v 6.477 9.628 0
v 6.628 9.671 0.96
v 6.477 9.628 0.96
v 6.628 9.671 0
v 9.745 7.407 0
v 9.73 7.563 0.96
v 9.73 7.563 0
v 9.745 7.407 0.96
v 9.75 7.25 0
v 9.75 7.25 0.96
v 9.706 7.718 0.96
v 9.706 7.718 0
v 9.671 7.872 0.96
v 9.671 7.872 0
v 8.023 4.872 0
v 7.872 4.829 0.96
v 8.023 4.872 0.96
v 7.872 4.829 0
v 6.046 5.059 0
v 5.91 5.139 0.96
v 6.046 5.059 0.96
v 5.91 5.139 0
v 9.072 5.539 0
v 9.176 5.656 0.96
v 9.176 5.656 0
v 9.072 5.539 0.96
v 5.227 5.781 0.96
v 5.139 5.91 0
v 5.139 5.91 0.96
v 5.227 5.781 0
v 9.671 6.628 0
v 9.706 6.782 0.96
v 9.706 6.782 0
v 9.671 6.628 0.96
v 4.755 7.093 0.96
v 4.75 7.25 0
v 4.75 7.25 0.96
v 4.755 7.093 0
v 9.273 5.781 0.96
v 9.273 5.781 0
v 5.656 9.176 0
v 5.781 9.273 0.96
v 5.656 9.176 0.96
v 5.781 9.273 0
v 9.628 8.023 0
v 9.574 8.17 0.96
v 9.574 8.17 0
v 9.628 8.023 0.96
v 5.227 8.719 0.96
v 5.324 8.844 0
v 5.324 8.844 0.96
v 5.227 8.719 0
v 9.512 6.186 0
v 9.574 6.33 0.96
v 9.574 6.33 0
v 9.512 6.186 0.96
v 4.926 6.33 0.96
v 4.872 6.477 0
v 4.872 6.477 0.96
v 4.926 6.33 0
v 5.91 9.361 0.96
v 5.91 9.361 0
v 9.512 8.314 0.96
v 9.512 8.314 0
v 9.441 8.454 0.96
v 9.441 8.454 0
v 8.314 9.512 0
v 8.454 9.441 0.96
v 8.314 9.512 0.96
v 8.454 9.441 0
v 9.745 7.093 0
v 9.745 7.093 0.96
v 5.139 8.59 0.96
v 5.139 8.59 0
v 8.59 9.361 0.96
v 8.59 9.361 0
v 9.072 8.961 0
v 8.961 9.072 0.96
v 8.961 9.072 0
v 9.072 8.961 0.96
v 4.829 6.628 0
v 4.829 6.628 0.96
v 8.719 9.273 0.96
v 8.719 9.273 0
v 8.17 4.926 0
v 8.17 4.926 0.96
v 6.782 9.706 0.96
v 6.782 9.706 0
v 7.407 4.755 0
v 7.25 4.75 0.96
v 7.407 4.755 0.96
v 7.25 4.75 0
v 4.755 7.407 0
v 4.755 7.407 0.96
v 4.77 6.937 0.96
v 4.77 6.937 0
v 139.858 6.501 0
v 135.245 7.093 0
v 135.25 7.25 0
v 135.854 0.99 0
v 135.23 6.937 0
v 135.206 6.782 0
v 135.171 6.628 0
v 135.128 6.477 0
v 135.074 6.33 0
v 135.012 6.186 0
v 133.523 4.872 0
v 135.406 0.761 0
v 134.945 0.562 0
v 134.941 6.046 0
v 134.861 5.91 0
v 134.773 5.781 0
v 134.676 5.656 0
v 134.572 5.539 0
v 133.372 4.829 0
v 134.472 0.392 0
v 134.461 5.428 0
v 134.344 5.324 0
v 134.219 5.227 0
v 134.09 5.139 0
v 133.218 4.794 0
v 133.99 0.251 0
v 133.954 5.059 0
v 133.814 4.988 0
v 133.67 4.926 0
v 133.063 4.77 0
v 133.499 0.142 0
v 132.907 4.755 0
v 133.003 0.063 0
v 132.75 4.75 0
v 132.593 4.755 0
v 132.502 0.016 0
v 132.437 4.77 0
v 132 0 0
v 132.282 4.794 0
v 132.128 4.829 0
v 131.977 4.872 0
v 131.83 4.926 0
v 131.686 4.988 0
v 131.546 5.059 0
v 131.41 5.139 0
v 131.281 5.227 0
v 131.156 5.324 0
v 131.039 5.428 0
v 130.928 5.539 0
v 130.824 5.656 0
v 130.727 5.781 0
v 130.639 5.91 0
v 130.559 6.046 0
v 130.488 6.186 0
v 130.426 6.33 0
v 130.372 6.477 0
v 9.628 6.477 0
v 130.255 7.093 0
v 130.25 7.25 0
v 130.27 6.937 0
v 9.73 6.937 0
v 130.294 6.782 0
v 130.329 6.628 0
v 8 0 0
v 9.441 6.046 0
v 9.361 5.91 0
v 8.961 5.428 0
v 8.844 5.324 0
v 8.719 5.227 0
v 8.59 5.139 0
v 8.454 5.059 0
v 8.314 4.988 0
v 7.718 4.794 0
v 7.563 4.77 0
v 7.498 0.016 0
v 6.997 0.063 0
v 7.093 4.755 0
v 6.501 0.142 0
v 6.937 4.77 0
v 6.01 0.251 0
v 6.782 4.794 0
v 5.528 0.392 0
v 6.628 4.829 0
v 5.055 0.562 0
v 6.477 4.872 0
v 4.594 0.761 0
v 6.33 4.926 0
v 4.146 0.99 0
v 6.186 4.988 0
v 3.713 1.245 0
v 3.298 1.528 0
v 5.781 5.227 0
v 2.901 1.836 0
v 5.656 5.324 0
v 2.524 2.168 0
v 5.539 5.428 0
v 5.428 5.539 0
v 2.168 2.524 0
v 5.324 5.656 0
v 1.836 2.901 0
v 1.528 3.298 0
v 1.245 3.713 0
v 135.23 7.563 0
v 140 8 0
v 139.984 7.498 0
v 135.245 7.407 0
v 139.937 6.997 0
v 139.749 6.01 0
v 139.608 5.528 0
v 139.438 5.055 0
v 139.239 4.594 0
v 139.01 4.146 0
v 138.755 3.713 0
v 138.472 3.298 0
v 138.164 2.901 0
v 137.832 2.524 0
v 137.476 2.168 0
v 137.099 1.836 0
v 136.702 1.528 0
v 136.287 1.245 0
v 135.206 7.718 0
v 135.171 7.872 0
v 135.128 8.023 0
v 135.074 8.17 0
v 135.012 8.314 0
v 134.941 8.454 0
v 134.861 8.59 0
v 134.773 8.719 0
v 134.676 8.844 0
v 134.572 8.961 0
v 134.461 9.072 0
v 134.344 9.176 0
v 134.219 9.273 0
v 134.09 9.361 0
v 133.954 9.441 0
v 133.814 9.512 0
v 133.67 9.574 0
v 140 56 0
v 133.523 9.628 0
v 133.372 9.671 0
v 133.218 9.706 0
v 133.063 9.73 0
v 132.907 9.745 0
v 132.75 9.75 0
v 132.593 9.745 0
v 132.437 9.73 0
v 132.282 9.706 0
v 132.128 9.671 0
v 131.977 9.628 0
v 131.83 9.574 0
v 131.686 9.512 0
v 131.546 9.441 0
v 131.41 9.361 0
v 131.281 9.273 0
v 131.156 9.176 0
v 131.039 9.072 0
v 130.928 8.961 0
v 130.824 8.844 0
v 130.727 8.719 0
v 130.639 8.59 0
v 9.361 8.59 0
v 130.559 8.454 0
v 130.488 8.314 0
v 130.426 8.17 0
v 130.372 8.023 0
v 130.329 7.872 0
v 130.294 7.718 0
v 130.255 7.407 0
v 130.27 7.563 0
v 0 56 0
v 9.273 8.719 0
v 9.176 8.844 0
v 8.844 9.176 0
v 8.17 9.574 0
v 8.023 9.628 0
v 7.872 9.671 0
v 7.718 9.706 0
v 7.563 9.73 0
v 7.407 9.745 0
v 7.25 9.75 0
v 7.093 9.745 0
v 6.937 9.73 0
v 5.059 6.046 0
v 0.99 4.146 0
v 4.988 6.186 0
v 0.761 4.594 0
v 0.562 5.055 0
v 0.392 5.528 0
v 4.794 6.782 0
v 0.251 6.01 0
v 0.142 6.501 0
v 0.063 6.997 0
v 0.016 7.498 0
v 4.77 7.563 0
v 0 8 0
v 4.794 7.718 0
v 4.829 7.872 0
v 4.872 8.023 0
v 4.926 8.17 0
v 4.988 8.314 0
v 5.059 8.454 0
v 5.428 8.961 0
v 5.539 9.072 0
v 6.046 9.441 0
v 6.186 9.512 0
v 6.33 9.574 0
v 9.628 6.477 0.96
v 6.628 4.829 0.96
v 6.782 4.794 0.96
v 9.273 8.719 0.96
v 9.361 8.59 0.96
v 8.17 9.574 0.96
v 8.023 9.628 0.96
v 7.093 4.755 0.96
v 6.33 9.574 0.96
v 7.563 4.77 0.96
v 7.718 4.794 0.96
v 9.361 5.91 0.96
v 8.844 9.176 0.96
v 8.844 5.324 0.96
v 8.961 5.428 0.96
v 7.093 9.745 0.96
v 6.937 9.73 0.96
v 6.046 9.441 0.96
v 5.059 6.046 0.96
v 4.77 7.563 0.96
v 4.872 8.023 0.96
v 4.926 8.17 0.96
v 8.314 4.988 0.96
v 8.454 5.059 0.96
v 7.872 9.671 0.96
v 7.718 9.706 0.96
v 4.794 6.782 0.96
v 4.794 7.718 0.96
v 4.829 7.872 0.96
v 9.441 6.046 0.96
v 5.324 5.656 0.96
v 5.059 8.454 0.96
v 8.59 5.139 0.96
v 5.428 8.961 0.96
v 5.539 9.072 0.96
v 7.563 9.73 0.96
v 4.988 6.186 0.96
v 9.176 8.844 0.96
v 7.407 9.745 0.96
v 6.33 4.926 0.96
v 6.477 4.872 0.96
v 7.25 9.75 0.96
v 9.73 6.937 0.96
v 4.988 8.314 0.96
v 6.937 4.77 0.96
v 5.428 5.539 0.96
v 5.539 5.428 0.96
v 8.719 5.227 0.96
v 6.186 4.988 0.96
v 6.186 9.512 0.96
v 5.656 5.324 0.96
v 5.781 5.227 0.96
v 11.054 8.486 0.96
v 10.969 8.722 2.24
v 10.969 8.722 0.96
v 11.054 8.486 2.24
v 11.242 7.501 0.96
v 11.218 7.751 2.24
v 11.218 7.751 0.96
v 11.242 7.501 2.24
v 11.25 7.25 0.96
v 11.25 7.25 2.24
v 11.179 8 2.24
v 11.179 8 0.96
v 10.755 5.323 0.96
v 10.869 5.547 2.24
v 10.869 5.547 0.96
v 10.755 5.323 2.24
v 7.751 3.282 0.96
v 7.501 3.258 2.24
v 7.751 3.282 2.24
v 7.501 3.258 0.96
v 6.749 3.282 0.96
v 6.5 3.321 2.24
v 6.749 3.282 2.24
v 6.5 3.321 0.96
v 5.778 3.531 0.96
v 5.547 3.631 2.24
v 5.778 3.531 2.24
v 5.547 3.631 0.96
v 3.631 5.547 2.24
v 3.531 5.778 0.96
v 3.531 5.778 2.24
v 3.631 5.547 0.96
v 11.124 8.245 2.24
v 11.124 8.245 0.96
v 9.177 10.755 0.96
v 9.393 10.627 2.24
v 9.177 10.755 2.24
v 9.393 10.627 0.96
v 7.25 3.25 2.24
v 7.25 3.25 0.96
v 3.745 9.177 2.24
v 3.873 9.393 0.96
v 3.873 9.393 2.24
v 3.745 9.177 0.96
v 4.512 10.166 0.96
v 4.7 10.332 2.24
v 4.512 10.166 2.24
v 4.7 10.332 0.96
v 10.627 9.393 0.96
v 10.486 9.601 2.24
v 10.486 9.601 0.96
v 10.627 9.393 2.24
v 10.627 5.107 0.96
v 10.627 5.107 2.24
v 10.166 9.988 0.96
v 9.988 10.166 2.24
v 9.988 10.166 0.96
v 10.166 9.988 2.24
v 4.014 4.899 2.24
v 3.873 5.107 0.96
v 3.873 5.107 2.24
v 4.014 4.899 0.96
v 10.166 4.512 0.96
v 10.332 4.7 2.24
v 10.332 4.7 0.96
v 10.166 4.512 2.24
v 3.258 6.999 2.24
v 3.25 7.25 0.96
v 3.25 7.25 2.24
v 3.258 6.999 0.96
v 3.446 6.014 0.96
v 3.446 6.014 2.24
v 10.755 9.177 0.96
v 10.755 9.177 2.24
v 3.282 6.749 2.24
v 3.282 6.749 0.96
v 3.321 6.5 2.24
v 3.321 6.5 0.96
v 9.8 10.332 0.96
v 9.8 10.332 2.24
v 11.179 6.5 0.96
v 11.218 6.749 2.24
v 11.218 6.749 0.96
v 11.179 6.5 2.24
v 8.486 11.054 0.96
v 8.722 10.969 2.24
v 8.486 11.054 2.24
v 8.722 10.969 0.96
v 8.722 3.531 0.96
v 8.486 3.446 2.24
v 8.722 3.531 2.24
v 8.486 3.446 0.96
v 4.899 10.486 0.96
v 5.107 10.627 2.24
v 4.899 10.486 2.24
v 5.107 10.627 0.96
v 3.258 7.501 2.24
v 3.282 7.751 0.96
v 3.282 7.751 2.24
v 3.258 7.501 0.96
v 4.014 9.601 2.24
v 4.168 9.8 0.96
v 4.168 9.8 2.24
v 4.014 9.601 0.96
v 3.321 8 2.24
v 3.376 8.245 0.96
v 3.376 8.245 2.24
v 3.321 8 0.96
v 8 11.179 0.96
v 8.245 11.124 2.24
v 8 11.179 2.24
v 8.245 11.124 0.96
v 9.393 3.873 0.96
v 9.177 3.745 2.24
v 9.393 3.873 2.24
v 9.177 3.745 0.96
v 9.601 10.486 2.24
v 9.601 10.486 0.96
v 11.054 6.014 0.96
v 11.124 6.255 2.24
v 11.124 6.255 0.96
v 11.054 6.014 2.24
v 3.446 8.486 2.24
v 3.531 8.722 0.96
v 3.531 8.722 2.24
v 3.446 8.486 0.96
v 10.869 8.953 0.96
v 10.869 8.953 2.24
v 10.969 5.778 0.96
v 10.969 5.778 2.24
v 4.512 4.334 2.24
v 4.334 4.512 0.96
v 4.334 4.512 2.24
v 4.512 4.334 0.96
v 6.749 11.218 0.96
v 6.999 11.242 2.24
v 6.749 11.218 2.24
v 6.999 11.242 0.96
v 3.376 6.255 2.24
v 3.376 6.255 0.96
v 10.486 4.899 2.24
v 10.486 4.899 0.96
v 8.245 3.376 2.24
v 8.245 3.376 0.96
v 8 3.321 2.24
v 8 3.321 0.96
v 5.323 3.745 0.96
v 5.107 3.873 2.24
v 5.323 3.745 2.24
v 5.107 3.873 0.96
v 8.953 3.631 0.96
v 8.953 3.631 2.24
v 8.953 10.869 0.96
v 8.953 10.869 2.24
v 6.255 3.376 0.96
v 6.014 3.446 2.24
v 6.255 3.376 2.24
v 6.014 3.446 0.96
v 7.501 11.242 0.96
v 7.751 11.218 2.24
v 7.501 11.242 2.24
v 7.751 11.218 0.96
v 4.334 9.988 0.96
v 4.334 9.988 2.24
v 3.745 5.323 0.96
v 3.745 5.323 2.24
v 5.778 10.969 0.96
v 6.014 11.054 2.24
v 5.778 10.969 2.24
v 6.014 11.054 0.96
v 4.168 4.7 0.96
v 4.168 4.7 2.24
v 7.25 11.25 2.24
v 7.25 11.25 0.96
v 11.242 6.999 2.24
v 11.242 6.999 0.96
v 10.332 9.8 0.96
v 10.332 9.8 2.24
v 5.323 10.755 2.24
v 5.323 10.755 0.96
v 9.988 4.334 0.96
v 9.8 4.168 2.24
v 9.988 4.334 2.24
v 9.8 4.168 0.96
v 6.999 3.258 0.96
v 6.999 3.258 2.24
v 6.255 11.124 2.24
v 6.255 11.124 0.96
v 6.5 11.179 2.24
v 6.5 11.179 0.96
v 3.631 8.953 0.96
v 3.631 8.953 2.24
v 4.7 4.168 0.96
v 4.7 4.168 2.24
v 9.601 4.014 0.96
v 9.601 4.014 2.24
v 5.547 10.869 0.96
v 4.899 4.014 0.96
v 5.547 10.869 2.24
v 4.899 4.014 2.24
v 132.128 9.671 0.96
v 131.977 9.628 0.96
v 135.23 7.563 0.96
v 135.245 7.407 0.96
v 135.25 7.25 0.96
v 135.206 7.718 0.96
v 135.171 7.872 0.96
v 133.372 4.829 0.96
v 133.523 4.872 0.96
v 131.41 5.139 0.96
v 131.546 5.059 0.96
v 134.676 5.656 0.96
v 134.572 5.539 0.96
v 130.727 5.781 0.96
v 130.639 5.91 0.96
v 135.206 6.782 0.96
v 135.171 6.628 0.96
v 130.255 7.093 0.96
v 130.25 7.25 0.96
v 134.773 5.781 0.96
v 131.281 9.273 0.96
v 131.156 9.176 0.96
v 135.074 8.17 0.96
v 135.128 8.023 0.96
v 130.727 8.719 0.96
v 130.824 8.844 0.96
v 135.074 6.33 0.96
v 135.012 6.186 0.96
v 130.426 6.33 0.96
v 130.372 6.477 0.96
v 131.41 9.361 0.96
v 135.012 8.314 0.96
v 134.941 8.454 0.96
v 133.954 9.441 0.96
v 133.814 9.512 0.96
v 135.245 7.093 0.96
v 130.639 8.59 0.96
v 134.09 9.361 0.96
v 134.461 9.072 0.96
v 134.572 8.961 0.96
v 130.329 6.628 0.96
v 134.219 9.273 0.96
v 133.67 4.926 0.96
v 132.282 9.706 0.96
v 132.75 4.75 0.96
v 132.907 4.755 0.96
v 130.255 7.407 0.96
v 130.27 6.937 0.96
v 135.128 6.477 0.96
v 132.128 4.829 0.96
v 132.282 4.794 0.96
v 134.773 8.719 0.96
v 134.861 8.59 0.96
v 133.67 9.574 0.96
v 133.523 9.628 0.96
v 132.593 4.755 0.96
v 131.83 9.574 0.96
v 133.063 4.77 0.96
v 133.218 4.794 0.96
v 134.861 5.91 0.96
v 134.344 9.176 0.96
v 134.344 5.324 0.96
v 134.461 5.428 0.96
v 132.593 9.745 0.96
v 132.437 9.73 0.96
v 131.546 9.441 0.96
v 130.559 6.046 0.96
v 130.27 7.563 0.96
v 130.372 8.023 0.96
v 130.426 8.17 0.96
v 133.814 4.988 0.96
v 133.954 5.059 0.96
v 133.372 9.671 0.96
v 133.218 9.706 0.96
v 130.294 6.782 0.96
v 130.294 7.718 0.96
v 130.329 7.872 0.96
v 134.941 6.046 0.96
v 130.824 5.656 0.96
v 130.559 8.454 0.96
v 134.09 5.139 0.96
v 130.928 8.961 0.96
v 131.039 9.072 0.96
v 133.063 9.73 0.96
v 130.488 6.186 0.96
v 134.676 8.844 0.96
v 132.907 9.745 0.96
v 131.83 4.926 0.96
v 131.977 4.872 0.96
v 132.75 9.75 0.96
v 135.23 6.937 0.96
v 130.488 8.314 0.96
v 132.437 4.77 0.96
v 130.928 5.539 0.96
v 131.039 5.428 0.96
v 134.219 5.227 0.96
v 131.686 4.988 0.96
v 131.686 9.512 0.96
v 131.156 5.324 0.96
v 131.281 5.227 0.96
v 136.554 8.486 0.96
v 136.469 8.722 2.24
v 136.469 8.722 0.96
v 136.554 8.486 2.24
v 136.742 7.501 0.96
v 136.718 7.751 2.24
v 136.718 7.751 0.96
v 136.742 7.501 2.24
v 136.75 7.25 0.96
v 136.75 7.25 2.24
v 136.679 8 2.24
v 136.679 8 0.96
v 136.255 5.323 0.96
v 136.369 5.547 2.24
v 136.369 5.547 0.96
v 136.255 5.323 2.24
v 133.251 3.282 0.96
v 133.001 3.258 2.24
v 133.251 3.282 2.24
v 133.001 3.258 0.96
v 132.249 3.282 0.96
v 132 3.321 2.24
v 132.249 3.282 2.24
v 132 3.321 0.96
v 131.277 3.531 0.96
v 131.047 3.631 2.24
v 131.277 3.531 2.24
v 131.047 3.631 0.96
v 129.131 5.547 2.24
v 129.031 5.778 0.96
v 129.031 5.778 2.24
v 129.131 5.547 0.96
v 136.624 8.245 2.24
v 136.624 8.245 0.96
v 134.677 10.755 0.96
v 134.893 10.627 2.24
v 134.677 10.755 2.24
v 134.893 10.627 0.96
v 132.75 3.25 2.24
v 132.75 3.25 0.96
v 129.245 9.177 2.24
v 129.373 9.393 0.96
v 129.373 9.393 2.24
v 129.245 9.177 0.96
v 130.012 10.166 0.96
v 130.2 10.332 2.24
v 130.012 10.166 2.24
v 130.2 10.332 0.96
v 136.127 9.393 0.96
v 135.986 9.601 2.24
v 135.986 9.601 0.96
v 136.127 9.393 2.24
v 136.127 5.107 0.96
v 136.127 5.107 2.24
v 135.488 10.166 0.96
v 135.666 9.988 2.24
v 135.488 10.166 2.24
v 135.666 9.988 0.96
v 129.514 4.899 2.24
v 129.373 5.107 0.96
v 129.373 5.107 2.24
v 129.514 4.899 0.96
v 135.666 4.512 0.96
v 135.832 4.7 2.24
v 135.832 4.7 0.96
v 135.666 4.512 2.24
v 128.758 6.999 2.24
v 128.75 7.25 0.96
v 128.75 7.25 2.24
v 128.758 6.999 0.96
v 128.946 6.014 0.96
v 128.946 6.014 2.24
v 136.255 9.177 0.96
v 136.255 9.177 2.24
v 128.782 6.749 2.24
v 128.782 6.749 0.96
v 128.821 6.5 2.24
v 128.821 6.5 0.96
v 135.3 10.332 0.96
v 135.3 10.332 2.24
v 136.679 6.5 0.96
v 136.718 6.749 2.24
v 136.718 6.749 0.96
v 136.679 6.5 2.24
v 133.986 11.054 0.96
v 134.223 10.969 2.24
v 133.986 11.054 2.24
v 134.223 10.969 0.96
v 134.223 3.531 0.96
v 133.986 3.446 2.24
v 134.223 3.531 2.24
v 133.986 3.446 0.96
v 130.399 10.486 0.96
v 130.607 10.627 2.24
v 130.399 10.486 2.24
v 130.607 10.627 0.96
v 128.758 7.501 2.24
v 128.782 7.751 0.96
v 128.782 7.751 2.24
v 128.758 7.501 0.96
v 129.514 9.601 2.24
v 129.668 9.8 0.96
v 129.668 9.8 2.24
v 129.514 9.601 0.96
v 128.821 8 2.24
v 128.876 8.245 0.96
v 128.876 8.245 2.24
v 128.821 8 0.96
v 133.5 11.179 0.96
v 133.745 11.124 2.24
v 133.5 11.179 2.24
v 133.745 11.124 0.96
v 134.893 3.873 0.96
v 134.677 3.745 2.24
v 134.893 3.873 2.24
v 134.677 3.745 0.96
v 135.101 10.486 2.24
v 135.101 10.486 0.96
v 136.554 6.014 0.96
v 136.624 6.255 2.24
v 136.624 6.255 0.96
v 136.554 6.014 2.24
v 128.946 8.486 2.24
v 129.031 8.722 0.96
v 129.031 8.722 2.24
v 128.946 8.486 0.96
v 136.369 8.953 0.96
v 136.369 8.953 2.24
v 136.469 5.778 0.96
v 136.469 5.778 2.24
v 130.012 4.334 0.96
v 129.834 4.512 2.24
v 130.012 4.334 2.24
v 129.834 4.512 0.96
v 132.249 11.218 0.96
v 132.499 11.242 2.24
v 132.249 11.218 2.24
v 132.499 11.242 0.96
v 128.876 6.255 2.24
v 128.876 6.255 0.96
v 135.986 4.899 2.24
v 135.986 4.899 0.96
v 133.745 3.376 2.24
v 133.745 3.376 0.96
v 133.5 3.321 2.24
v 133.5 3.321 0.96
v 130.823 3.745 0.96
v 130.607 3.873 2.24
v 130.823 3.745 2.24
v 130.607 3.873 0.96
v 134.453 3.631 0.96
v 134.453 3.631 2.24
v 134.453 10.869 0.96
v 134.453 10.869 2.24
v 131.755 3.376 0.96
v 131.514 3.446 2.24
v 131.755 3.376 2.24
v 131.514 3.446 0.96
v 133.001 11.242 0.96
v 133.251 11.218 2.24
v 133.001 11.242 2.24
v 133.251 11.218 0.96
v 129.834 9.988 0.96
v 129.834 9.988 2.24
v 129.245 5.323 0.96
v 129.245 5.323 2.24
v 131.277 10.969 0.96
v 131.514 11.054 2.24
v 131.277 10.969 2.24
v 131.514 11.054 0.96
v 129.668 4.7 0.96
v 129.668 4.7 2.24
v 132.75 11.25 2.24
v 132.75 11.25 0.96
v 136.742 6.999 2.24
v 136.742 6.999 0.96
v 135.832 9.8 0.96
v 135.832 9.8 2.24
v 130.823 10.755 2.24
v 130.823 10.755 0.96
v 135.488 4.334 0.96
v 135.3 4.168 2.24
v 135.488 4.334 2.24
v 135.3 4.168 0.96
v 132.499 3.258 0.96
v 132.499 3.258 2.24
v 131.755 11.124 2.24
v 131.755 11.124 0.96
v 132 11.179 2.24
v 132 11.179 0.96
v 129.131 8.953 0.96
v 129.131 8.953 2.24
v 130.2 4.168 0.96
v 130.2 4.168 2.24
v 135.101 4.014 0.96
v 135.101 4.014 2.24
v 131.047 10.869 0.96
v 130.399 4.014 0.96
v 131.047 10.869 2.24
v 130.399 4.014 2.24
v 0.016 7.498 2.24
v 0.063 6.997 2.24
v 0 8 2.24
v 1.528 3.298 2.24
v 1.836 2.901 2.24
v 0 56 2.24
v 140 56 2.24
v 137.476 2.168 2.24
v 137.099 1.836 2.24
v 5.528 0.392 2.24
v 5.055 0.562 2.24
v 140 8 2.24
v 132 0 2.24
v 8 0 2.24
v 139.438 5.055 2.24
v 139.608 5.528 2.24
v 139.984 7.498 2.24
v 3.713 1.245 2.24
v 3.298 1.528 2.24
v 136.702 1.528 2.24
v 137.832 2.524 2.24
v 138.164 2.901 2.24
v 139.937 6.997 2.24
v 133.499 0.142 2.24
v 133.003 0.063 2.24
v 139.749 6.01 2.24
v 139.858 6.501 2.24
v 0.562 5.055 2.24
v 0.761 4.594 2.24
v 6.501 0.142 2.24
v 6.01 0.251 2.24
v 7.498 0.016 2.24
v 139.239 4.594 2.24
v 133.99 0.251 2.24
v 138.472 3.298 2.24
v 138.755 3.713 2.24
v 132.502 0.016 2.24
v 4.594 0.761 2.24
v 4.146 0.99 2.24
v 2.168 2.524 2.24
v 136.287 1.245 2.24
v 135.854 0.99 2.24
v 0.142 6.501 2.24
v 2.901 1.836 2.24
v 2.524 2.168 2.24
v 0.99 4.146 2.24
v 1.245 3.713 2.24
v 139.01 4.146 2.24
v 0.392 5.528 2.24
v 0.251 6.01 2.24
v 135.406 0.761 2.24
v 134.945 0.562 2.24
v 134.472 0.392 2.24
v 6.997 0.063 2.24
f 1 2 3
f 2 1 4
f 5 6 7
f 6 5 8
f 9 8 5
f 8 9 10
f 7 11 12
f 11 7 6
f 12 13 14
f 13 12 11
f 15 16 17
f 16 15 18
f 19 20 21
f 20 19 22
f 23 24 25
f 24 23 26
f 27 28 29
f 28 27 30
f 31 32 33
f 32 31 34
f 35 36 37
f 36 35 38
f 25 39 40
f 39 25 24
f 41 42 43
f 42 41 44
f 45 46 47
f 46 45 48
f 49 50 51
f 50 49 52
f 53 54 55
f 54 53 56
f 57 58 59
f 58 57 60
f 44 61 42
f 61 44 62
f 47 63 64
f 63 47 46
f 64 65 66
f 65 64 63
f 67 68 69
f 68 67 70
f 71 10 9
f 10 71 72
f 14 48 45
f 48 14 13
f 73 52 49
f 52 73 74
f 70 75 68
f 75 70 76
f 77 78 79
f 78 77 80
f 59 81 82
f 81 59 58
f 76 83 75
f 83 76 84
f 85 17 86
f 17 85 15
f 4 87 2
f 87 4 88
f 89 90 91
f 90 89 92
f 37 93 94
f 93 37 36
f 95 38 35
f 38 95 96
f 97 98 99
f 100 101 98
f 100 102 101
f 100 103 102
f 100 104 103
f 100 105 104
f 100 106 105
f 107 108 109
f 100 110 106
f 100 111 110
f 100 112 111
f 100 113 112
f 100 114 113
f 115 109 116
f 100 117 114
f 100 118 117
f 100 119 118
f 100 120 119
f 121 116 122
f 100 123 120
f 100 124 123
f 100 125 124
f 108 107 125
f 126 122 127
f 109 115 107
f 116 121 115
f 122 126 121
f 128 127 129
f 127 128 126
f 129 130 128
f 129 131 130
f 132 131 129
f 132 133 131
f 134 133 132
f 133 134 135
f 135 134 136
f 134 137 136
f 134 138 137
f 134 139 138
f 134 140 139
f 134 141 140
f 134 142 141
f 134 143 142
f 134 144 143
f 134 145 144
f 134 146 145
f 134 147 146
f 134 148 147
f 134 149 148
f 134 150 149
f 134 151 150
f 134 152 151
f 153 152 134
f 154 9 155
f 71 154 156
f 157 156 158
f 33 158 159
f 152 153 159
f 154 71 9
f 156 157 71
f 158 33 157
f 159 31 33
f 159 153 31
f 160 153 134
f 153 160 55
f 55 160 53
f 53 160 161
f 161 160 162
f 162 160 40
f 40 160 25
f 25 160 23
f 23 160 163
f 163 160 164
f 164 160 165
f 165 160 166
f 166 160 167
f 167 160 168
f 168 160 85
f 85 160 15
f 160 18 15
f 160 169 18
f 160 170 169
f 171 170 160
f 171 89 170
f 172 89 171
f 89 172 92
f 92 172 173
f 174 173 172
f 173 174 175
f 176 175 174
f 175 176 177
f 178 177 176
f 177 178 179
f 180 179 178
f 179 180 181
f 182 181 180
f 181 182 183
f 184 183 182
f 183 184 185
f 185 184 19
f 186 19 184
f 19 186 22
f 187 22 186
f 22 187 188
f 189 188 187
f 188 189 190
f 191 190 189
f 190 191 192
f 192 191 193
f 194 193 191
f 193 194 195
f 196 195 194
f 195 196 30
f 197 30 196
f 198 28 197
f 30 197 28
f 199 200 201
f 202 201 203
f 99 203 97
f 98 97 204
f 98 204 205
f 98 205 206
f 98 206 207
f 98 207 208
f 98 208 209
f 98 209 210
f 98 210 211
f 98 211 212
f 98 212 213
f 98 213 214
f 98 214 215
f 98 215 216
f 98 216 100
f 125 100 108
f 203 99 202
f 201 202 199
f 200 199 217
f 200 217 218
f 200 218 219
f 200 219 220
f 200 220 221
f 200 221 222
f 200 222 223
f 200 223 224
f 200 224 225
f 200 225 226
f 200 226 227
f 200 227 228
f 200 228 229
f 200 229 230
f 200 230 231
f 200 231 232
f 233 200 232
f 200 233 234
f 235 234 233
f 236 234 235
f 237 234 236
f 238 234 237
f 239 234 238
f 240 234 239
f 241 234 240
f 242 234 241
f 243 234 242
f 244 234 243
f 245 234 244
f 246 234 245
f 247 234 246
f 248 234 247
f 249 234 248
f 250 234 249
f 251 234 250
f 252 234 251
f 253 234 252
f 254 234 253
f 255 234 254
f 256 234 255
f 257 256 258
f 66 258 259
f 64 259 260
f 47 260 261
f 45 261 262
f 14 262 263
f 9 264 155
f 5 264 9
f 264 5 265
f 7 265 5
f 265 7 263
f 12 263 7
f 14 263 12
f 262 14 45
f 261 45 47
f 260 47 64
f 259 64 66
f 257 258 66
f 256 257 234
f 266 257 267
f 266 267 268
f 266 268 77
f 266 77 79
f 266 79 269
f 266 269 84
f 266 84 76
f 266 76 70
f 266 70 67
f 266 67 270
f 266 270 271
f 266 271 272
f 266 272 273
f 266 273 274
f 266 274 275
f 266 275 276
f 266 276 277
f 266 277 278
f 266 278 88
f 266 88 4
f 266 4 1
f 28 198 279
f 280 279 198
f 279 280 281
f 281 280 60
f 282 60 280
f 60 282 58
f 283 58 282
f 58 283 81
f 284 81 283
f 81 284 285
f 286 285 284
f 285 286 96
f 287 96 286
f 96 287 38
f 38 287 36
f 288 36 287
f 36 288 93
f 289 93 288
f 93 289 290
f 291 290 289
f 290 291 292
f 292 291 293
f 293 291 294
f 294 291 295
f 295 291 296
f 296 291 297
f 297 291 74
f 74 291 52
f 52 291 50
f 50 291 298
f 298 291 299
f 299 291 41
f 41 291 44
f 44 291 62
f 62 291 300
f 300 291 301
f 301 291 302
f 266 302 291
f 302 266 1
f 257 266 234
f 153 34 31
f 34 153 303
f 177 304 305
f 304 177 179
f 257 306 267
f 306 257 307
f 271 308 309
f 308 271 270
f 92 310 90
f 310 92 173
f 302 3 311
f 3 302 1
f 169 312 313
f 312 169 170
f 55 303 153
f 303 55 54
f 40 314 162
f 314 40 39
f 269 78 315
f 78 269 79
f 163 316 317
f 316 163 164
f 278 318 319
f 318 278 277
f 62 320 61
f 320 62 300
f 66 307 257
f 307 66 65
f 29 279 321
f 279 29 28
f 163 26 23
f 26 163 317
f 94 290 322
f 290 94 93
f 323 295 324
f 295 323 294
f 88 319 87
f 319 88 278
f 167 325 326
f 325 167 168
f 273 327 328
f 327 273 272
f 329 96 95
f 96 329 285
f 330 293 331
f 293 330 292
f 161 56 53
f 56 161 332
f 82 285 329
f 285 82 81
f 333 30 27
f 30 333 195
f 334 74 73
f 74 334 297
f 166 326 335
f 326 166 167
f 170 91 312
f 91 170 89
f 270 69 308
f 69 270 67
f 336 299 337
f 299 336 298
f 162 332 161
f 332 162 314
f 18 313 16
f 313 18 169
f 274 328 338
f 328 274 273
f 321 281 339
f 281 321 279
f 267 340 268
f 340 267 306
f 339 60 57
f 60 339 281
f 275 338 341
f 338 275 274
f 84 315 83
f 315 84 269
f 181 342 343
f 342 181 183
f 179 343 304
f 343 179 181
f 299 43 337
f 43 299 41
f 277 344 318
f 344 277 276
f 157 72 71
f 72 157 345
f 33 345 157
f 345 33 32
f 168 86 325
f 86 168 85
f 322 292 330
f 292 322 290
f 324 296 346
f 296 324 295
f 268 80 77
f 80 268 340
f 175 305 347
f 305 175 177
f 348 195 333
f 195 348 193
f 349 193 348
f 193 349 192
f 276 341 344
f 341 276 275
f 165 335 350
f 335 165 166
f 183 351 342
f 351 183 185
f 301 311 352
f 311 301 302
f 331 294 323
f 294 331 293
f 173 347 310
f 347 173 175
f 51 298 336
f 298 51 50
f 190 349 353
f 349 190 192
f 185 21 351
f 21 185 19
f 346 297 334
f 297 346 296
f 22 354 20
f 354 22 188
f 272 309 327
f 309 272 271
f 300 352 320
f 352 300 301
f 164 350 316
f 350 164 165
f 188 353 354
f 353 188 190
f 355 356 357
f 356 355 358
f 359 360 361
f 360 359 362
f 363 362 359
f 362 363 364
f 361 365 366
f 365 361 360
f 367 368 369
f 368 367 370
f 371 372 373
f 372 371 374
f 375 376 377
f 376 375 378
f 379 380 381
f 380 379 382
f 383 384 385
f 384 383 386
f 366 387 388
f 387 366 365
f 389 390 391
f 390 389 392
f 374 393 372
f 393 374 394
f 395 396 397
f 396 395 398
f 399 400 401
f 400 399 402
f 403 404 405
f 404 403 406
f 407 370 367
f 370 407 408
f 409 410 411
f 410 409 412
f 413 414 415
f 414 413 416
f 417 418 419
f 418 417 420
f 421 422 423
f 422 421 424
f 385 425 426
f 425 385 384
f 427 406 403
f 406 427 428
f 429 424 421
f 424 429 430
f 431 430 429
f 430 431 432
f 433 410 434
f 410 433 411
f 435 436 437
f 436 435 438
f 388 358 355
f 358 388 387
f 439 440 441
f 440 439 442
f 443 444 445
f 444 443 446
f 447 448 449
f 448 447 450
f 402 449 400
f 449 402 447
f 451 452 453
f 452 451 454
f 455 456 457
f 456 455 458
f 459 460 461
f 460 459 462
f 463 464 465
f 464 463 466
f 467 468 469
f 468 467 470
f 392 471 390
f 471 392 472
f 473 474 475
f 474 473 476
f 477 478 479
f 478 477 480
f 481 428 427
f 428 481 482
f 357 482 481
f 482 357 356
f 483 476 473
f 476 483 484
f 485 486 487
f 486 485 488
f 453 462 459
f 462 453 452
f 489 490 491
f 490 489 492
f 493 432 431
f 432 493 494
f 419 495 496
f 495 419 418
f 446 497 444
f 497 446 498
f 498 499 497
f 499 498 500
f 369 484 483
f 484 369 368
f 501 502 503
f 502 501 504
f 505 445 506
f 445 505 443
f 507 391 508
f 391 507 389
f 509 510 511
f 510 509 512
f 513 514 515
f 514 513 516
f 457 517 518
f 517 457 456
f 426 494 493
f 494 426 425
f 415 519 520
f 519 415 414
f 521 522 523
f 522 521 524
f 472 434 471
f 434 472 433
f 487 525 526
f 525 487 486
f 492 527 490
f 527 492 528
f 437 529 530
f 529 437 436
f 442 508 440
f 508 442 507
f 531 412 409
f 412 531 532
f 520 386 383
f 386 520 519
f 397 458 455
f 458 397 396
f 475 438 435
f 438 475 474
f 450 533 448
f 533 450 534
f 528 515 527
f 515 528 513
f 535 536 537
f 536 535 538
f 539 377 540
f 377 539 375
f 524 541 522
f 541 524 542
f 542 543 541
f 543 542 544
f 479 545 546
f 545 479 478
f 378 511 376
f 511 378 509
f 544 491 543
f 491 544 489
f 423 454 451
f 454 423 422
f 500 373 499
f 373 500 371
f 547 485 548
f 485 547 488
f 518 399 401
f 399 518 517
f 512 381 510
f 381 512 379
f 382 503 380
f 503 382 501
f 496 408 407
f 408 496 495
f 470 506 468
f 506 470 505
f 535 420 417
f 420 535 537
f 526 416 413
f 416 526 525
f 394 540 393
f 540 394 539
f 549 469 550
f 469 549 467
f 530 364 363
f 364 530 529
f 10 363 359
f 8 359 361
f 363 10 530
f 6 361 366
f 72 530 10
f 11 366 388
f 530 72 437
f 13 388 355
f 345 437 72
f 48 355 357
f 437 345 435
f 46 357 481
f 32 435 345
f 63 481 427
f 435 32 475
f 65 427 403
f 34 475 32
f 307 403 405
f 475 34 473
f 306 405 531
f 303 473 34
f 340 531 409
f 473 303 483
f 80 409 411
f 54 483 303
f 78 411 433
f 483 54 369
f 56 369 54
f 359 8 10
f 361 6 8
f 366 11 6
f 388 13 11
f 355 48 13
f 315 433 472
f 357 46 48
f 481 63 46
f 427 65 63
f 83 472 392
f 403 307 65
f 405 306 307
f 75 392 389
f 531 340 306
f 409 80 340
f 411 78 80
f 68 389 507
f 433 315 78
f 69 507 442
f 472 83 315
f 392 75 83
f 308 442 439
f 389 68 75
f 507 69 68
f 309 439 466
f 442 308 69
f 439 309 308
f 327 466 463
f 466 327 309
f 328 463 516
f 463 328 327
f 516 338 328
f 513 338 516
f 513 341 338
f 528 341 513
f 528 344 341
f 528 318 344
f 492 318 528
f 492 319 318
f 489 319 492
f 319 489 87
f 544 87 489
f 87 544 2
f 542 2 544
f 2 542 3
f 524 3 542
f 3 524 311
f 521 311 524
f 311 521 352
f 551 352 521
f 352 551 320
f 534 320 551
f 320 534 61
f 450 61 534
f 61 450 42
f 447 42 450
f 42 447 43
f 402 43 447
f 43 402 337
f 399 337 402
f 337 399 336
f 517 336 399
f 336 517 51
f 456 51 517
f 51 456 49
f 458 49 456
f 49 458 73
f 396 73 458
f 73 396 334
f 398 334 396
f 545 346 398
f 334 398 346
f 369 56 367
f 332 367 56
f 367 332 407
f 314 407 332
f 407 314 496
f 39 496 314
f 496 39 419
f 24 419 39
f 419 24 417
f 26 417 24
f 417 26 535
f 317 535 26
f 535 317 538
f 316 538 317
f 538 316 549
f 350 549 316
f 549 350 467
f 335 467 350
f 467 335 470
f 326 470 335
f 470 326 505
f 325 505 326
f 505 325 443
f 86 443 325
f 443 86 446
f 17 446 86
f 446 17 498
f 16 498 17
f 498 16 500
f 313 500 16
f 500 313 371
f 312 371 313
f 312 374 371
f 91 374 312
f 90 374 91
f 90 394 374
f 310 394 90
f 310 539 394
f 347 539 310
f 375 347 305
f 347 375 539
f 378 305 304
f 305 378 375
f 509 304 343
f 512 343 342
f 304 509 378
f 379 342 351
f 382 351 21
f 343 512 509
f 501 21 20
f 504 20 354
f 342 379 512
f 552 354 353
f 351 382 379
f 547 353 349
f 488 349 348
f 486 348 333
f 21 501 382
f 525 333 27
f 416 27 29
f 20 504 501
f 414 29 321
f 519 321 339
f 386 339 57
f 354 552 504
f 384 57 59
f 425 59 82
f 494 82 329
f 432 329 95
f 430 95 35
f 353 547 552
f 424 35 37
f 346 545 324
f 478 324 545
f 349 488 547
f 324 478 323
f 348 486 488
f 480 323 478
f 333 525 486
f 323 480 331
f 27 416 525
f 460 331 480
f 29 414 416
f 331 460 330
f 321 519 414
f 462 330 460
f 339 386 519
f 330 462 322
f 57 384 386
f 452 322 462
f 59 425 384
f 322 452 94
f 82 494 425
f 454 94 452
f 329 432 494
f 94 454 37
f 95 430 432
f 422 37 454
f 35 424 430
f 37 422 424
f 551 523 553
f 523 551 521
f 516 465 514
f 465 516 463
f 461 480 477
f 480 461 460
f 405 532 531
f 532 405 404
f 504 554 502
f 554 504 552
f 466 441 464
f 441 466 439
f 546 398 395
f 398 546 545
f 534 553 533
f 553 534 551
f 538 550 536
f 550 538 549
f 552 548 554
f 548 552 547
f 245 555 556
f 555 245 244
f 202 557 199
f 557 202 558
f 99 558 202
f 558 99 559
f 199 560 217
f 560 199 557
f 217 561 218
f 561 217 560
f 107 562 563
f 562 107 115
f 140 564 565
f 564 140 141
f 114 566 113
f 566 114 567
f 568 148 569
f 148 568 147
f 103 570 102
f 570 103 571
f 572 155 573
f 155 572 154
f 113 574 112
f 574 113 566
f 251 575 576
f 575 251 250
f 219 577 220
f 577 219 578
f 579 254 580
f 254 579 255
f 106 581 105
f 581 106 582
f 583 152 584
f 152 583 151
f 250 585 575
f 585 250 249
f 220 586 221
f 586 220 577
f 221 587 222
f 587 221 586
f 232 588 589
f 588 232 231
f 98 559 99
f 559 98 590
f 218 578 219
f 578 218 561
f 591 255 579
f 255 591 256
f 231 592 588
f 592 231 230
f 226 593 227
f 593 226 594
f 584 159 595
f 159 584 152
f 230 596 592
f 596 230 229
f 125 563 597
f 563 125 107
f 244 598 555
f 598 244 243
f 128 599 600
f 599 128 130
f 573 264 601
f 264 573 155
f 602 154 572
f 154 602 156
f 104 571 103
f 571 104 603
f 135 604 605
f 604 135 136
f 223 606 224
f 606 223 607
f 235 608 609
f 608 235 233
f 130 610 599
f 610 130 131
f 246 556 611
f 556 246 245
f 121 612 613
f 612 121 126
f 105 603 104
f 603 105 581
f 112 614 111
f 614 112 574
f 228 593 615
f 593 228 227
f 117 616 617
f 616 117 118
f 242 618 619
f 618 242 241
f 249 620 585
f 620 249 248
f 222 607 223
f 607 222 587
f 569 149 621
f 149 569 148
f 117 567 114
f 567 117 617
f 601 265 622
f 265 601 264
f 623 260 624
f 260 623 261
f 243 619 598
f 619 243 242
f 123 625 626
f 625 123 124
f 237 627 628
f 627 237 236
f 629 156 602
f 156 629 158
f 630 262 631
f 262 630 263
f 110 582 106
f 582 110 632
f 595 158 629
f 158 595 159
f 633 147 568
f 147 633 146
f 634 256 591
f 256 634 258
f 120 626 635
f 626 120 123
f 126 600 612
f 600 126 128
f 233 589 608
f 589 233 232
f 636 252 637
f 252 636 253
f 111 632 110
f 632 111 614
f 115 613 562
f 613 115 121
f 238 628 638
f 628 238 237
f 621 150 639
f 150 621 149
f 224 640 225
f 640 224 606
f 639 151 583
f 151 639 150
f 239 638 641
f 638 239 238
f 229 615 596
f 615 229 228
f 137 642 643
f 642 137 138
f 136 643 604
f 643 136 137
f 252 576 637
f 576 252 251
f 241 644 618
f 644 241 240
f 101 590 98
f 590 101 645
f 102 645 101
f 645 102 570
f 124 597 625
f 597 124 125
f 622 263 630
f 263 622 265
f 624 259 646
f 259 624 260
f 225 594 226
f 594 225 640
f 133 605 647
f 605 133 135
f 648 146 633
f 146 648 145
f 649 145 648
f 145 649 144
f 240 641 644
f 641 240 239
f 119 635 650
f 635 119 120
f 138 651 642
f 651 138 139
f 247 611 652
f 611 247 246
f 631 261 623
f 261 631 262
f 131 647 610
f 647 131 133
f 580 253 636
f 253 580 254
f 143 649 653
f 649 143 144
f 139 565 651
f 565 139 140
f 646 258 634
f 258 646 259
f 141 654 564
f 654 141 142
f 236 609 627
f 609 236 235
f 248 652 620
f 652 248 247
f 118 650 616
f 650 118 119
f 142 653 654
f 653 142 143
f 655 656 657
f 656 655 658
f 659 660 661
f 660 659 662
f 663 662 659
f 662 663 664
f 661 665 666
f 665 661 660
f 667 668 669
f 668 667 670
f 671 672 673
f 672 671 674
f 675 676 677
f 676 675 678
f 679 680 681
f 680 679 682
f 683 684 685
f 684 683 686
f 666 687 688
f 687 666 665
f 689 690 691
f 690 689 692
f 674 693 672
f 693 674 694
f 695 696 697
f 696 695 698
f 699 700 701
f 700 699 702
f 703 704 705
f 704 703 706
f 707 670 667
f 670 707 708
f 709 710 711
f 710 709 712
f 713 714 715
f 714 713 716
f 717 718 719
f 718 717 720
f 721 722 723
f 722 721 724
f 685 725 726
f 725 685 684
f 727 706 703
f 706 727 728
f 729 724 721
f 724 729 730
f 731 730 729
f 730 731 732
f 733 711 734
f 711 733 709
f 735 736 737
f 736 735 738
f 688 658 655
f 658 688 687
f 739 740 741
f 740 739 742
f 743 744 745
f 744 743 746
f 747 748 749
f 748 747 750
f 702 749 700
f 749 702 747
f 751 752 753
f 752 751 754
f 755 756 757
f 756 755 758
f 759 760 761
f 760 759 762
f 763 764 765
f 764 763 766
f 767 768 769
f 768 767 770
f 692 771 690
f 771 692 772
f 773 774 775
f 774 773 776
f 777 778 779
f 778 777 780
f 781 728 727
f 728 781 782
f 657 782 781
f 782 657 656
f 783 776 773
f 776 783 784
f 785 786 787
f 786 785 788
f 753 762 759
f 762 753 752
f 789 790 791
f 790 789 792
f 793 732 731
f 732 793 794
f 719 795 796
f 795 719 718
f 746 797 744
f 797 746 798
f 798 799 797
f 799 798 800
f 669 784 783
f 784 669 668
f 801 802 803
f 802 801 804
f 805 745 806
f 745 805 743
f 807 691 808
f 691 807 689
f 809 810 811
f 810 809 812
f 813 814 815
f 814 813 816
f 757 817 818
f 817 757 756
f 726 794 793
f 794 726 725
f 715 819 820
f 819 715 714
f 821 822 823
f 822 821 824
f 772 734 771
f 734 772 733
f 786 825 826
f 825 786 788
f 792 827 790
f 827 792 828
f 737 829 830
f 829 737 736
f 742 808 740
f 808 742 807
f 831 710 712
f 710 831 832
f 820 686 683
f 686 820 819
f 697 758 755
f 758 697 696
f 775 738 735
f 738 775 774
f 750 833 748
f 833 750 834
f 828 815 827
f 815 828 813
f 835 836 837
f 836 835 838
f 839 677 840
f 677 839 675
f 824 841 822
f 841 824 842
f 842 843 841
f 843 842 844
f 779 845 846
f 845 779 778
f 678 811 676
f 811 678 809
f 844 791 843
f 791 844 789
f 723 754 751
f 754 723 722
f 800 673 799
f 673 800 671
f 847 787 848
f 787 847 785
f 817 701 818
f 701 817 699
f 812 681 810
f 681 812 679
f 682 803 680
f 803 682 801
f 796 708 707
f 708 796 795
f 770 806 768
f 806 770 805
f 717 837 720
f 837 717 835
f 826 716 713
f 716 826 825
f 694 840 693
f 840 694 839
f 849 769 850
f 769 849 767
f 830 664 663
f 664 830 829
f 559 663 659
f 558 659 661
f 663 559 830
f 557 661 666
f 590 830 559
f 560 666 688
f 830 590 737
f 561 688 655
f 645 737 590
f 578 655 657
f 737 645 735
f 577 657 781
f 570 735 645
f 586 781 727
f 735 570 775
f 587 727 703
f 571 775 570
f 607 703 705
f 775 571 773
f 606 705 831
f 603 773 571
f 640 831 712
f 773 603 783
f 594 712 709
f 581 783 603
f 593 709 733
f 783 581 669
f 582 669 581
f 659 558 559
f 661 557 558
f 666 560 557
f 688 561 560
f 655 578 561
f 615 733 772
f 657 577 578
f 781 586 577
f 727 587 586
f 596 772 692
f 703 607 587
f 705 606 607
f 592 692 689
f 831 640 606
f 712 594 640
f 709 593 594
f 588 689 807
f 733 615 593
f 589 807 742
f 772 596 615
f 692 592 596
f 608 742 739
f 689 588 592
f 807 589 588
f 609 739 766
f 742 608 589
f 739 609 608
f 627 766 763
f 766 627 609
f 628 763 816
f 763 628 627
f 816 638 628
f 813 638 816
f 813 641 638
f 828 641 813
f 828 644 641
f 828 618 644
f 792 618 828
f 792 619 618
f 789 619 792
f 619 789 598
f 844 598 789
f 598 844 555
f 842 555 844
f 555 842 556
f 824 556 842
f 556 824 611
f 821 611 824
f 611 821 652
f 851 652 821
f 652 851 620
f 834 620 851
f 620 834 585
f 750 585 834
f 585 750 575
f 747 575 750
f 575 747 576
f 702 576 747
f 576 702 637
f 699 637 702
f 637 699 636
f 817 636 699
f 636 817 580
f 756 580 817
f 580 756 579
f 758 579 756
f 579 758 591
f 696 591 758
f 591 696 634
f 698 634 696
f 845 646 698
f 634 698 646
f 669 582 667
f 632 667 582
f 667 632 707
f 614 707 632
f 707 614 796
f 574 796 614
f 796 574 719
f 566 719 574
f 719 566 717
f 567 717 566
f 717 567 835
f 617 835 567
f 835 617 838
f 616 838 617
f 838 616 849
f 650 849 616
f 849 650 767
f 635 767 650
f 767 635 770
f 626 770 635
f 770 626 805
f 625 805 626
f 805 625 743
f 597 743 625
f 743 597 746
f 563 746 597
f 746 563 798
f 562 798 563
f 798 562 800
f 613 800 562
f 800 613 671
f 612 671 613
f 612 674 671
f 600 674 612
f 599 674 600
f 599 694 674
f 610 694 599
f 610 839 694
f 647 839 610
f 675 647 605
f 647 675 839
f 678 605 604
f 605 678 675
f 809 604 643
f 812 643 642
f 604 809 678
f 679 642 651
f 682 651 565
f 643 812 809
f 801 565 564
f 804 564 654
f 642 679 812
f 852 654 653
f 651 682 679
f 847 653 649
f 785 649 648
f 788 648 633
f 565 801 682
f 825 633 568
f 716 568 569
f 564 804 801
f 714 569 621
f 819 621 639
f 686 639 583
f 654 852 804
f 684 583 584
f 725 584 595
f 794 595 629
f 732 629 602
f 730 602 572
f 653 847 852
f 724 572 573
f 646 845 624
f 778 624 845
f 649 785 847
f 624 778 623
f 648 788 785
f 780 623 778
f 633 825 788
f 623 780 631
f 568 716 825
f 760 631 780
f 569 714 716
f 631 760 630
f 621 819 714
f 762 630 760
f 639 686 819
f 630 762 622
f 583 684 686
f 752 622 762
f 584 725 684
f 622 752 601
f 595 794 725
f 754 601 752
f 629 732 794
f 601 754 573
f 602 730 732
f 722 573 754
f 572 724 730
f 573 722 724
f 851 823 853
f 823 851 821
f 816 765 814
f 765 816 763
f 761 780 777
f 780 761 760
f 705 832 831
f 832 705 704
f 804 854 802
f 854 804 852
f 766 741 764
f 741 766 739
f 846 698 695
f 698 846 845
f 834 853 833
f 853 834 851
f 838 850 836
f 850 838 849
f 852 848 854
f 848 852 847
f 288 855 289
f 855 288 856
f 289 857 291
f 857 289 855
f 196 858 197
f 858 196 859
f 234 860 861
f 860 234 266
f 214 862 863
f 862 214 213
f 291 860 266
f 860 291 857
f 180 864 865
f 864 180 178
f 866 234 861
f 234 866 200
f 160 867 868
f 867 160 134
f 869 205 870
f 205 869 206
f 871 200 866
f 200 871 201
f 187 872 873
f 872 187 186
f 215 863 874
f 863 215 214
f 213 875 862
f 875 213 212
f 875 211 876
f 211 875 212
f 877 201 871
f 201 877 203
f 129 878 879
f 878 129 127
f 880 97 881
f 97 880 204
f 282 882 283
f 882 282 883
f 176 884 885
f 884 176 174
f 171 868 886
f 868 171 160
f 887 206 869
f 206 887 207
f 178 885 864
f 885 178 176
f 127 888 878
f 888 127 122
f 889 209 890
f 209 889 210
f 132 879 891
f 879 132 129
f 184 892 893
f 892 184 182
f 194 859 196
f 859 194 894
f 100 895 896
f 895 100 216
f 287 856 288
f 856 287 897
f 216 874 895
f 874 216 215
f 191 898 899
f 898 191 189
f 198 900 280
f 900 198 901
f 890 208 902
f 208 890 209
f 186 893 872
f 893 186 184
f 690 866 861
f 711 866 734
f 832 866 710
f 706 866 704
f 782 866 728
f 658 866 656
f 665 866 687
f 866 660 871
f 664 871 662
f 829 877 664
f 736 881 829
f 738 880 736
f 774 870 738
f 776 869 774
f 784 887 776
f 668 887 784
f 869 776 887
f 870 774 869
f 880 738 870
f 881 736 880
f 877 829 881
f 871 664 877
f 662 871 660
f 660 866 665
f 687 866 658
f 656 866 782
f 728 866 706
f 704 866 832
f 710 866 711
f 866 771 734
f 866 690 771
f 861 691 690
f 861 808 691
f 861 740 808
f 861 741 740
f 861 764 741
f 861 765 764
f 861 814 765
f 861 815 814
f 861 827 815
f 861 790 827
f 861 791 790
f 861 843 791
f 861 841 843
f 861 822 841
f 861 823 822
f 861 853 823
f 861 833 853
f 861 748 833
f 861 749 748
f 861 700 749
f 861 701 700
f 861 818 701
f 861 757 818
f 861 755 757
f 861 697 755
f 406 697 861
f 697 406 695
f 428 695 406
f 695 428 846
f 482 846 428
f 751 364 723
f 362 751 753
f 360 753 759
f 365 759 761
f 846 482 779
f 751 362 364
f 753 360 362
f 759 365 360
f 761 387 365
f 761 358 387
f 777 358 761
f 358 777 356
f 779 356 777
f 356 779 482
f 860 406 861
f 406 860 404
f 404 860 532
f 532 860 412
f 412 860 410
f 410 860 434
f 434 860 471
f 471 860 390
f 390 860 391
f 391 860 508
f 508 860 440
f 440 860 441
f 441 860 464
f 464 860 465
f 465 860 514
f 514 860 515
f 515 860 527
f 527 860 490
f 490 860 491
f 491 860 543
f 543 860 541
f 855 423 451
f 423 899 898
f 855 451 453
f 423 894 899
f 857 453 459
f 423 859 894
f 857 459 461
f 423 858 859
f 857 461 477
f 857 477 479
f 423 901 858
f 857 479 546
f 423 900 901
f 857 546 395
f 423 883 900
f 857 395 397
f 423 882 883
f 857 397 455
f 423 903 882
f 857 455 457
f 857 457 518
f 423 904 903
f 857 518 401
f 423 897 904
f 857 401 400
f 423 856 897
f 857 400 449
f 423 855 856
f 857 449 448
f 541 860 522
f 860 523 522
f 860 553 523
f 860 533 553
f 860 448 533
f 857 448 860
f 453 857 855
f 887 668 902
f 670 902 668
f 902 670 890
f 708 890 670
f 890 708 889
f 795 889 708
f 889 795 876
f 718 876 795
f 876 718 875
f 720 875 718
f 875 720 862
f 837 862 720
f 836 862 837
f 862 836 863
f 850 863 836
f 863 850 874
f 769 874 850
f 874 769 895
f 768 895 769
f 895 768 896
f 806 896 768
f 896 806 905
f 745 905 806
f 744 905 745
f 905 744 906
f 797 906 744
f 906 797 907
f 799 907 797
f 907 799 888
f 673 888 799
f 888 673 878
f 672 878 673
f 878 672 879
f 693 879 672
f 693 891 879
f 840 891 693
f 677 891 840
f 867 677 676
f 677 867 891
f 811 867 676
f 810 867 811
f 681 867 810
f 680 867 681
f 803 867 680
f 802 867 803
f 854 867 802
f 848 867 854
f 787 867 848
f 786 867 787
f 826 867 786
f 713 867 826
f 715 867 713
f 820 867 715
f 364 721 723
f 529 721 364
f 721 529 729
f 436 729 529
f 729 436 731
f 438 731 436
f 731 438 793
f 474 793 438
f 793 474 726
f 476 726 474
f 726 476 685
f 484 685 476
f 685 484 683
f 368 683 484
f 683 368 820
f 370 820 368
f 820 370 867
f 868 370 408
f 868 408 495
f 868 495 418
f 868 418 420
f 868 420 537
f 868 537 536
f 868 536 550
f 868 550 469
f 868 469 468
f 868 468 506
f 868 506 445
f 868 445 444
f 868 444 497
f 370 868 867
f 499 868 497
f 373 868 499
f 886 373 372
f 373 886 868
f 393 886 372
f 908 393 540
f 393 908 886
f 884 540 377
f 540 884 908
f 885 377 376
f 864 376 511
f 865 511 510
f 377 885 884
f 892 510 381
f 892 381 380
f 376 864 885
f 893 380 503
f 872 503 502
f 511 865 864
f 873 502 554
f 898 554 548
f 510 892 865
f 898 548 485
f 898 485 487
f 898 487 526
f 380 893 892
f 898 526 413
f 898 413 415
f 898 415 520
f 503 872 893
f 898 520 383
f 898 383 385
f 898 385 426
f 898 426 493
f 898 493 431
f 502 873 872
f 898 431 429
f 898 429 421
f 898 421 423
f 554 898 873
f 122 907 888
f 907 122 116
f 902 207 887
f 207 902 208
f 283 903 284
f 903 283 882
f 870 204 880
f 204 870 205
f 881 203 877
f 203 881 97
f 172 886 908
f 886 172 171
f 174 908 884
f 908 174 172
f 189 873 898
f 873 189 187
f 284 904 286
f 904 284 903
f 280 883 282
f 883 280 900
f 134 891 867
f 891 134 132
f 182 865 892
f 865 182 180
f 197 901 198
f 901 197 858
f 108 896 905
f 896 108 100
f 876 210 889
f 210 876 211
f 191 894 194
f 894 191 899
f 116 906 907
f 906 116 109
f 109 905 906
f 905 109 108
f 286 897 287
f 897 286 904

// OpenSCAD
//minkowski() {
//    difference() {
//        cube([138, 53, 1.5]);
//        union() {
//            translate([6.25, 6.25, 0])
//            screw_hole();
//            translate([138 - 6.25, 6.25, 0])
//            screw_hole();
//        }
//    }
//    cylinder(r=1, h=0.01, $fn=24);
//}

$fn=100;
module screw_hole(height) {
    color("black")
    cylinder(r=5/2, h=height+0.96);

    color("red")
    translate([0, 0, 0.96])
    cylinder(r=8/2, h=height);
}

l = 56;
w = 140;
//h = 32.5;
t = 2.24;


module base() {
    linear_extrude(height=t) {
        hull() {
            color("blue")
            translate([8, 8])
            circle(r=8);

            color("blue")
            translate([w-8, 8])
            circle(r=8);

            color("blue")
            translate([0,l-5])
            square([5,5]);

            color("blue")
            translate([w-5,l-5])
            square([5,5]);
        }
    }
}

difference() {
    base();
    union() {
        translate([7.25, 7.25, 0])
        screw_hole(12);
        translate([w - 7.25, 7.25, 0])
        screw_hole(12);
    }
}

// angled
//hyp = sqrt(pow(l,2) + pow(h,2));
//
//module prism() {
//    hull() {
//        cube([w, l, t]);
//
//        rotate([acos(l/hyp),0,0])
//        cube([1,hyp,t]);
//
//        rotate([acos(l/hyp),0,0])
//        translate([w-1,0,0])
//        cube([1,hyp,t]);
//    }
//}
//
//module hollowed() {
//    difference() {
//        prism();
//        translate([t,1,-1])
//        scale([0.98,1,1])
//        prism();
//    }
//}
//
//
//module shroud() {
//    difference() {
//        union() {
//            hollowed();
//            hull() {
//                intersection() {
//                    hollowed();
//                    cube([12,12,12]);
//                }
//                cube([12,12,1]);
//            }
//            hull() {
//                intersection() {
//                    hollowed();
//                    translate([w - 12, 0, 0])
//                    cube([12,12,12]);
//                }
//                translate([w - 12, 0, 0])
//                cube([12,12,1]);
//            }
//        }
//        translate([6.25, 6.25, 0])
//        screw_hole(12);
//        translate([w - 6.25, 6.25, 0])
//        screw_hole(12);
//    }
//}
//
//module left_shroud() {
//    shroud();
//    translate([0,l - 1,0])
//    cube([1.5, 9 + 1, h]);
//}
//
//
//module hergh() {
//    difference() {
//        left_shroud();
//        color("red")
//        translate([w-10, l-3, h-3])
//        cube([10-t+.3, 3, 10]);
//    }
//
//    color("red")
//    translate([w-10, l-3, h-3-1.5])
//    cube([10, 3, 1.5]);
//
//    color("red")
//    translate([w-10, l-4.5, h-3-1.5])
//    cube([10, 1.5, 3]);
//
//
//
//    hull() {
//        intersection() {
//            left_shroud();
//            color("red")
//            translate([w-10-1.5, l-4.5, h-3-1.5])
//            cube([1.5, 4.5, 5]);
//        }
//
//        color("blue")
//        translate([w-10-1.5, l-4.5, h-3-1.5])
//        cube([1.5, 4.5, 1.5]);
//    }
//}
//
//translate([-1,0,0])
//intersection() {
//    hergh();
//    color("blue")
//    translate([w-1.3, l-4.5, h-3-1.5])
//    cube([1.4, 6, 6]);
//}
//hergh();
//
//
////l = 45;
////h = 37;
//_w = w - 80;
//_ww = w - _w;
//_h = h - 16 + 4.5;
//_hh = h - _h;
//_l = l - 20 - 2.5;
//_ll = l - _l;
//_hyp = sqrt(pow(_ll, 2) + pow(_hh, 2));
//
//
//module _right_shroud() {
//    difference() {
//        union() {
//            shroud();
//            translate([w-t+.24,l - 1,0])
//            cube([t-.24, 9+1, h+1]);
//        }
//
//        translate([_ww,_l,_h])
//        cube([_w, 35, 22]);
//    }
//}
//
//
//module right_shroud() {
//    translate([_ww-1.5,_l+3,_h-1.5])
//    cube([_w+1.5,_ll-3, t]);
//
//    hull() {
//        intersection() {
//            translate([_ww-t,_l+3,_h-1.5])
//            cube([t,_l-3,_h]);
//            _right_shroud();
//        }
//        translate([_ww-t,_l+3,_h-1.5])
//        cube([t,_ll-3, t]);
//    }
//    _right_shroud();
//}
//
////left_shroud();
////translate([w,0,0])
////right_shroud();
